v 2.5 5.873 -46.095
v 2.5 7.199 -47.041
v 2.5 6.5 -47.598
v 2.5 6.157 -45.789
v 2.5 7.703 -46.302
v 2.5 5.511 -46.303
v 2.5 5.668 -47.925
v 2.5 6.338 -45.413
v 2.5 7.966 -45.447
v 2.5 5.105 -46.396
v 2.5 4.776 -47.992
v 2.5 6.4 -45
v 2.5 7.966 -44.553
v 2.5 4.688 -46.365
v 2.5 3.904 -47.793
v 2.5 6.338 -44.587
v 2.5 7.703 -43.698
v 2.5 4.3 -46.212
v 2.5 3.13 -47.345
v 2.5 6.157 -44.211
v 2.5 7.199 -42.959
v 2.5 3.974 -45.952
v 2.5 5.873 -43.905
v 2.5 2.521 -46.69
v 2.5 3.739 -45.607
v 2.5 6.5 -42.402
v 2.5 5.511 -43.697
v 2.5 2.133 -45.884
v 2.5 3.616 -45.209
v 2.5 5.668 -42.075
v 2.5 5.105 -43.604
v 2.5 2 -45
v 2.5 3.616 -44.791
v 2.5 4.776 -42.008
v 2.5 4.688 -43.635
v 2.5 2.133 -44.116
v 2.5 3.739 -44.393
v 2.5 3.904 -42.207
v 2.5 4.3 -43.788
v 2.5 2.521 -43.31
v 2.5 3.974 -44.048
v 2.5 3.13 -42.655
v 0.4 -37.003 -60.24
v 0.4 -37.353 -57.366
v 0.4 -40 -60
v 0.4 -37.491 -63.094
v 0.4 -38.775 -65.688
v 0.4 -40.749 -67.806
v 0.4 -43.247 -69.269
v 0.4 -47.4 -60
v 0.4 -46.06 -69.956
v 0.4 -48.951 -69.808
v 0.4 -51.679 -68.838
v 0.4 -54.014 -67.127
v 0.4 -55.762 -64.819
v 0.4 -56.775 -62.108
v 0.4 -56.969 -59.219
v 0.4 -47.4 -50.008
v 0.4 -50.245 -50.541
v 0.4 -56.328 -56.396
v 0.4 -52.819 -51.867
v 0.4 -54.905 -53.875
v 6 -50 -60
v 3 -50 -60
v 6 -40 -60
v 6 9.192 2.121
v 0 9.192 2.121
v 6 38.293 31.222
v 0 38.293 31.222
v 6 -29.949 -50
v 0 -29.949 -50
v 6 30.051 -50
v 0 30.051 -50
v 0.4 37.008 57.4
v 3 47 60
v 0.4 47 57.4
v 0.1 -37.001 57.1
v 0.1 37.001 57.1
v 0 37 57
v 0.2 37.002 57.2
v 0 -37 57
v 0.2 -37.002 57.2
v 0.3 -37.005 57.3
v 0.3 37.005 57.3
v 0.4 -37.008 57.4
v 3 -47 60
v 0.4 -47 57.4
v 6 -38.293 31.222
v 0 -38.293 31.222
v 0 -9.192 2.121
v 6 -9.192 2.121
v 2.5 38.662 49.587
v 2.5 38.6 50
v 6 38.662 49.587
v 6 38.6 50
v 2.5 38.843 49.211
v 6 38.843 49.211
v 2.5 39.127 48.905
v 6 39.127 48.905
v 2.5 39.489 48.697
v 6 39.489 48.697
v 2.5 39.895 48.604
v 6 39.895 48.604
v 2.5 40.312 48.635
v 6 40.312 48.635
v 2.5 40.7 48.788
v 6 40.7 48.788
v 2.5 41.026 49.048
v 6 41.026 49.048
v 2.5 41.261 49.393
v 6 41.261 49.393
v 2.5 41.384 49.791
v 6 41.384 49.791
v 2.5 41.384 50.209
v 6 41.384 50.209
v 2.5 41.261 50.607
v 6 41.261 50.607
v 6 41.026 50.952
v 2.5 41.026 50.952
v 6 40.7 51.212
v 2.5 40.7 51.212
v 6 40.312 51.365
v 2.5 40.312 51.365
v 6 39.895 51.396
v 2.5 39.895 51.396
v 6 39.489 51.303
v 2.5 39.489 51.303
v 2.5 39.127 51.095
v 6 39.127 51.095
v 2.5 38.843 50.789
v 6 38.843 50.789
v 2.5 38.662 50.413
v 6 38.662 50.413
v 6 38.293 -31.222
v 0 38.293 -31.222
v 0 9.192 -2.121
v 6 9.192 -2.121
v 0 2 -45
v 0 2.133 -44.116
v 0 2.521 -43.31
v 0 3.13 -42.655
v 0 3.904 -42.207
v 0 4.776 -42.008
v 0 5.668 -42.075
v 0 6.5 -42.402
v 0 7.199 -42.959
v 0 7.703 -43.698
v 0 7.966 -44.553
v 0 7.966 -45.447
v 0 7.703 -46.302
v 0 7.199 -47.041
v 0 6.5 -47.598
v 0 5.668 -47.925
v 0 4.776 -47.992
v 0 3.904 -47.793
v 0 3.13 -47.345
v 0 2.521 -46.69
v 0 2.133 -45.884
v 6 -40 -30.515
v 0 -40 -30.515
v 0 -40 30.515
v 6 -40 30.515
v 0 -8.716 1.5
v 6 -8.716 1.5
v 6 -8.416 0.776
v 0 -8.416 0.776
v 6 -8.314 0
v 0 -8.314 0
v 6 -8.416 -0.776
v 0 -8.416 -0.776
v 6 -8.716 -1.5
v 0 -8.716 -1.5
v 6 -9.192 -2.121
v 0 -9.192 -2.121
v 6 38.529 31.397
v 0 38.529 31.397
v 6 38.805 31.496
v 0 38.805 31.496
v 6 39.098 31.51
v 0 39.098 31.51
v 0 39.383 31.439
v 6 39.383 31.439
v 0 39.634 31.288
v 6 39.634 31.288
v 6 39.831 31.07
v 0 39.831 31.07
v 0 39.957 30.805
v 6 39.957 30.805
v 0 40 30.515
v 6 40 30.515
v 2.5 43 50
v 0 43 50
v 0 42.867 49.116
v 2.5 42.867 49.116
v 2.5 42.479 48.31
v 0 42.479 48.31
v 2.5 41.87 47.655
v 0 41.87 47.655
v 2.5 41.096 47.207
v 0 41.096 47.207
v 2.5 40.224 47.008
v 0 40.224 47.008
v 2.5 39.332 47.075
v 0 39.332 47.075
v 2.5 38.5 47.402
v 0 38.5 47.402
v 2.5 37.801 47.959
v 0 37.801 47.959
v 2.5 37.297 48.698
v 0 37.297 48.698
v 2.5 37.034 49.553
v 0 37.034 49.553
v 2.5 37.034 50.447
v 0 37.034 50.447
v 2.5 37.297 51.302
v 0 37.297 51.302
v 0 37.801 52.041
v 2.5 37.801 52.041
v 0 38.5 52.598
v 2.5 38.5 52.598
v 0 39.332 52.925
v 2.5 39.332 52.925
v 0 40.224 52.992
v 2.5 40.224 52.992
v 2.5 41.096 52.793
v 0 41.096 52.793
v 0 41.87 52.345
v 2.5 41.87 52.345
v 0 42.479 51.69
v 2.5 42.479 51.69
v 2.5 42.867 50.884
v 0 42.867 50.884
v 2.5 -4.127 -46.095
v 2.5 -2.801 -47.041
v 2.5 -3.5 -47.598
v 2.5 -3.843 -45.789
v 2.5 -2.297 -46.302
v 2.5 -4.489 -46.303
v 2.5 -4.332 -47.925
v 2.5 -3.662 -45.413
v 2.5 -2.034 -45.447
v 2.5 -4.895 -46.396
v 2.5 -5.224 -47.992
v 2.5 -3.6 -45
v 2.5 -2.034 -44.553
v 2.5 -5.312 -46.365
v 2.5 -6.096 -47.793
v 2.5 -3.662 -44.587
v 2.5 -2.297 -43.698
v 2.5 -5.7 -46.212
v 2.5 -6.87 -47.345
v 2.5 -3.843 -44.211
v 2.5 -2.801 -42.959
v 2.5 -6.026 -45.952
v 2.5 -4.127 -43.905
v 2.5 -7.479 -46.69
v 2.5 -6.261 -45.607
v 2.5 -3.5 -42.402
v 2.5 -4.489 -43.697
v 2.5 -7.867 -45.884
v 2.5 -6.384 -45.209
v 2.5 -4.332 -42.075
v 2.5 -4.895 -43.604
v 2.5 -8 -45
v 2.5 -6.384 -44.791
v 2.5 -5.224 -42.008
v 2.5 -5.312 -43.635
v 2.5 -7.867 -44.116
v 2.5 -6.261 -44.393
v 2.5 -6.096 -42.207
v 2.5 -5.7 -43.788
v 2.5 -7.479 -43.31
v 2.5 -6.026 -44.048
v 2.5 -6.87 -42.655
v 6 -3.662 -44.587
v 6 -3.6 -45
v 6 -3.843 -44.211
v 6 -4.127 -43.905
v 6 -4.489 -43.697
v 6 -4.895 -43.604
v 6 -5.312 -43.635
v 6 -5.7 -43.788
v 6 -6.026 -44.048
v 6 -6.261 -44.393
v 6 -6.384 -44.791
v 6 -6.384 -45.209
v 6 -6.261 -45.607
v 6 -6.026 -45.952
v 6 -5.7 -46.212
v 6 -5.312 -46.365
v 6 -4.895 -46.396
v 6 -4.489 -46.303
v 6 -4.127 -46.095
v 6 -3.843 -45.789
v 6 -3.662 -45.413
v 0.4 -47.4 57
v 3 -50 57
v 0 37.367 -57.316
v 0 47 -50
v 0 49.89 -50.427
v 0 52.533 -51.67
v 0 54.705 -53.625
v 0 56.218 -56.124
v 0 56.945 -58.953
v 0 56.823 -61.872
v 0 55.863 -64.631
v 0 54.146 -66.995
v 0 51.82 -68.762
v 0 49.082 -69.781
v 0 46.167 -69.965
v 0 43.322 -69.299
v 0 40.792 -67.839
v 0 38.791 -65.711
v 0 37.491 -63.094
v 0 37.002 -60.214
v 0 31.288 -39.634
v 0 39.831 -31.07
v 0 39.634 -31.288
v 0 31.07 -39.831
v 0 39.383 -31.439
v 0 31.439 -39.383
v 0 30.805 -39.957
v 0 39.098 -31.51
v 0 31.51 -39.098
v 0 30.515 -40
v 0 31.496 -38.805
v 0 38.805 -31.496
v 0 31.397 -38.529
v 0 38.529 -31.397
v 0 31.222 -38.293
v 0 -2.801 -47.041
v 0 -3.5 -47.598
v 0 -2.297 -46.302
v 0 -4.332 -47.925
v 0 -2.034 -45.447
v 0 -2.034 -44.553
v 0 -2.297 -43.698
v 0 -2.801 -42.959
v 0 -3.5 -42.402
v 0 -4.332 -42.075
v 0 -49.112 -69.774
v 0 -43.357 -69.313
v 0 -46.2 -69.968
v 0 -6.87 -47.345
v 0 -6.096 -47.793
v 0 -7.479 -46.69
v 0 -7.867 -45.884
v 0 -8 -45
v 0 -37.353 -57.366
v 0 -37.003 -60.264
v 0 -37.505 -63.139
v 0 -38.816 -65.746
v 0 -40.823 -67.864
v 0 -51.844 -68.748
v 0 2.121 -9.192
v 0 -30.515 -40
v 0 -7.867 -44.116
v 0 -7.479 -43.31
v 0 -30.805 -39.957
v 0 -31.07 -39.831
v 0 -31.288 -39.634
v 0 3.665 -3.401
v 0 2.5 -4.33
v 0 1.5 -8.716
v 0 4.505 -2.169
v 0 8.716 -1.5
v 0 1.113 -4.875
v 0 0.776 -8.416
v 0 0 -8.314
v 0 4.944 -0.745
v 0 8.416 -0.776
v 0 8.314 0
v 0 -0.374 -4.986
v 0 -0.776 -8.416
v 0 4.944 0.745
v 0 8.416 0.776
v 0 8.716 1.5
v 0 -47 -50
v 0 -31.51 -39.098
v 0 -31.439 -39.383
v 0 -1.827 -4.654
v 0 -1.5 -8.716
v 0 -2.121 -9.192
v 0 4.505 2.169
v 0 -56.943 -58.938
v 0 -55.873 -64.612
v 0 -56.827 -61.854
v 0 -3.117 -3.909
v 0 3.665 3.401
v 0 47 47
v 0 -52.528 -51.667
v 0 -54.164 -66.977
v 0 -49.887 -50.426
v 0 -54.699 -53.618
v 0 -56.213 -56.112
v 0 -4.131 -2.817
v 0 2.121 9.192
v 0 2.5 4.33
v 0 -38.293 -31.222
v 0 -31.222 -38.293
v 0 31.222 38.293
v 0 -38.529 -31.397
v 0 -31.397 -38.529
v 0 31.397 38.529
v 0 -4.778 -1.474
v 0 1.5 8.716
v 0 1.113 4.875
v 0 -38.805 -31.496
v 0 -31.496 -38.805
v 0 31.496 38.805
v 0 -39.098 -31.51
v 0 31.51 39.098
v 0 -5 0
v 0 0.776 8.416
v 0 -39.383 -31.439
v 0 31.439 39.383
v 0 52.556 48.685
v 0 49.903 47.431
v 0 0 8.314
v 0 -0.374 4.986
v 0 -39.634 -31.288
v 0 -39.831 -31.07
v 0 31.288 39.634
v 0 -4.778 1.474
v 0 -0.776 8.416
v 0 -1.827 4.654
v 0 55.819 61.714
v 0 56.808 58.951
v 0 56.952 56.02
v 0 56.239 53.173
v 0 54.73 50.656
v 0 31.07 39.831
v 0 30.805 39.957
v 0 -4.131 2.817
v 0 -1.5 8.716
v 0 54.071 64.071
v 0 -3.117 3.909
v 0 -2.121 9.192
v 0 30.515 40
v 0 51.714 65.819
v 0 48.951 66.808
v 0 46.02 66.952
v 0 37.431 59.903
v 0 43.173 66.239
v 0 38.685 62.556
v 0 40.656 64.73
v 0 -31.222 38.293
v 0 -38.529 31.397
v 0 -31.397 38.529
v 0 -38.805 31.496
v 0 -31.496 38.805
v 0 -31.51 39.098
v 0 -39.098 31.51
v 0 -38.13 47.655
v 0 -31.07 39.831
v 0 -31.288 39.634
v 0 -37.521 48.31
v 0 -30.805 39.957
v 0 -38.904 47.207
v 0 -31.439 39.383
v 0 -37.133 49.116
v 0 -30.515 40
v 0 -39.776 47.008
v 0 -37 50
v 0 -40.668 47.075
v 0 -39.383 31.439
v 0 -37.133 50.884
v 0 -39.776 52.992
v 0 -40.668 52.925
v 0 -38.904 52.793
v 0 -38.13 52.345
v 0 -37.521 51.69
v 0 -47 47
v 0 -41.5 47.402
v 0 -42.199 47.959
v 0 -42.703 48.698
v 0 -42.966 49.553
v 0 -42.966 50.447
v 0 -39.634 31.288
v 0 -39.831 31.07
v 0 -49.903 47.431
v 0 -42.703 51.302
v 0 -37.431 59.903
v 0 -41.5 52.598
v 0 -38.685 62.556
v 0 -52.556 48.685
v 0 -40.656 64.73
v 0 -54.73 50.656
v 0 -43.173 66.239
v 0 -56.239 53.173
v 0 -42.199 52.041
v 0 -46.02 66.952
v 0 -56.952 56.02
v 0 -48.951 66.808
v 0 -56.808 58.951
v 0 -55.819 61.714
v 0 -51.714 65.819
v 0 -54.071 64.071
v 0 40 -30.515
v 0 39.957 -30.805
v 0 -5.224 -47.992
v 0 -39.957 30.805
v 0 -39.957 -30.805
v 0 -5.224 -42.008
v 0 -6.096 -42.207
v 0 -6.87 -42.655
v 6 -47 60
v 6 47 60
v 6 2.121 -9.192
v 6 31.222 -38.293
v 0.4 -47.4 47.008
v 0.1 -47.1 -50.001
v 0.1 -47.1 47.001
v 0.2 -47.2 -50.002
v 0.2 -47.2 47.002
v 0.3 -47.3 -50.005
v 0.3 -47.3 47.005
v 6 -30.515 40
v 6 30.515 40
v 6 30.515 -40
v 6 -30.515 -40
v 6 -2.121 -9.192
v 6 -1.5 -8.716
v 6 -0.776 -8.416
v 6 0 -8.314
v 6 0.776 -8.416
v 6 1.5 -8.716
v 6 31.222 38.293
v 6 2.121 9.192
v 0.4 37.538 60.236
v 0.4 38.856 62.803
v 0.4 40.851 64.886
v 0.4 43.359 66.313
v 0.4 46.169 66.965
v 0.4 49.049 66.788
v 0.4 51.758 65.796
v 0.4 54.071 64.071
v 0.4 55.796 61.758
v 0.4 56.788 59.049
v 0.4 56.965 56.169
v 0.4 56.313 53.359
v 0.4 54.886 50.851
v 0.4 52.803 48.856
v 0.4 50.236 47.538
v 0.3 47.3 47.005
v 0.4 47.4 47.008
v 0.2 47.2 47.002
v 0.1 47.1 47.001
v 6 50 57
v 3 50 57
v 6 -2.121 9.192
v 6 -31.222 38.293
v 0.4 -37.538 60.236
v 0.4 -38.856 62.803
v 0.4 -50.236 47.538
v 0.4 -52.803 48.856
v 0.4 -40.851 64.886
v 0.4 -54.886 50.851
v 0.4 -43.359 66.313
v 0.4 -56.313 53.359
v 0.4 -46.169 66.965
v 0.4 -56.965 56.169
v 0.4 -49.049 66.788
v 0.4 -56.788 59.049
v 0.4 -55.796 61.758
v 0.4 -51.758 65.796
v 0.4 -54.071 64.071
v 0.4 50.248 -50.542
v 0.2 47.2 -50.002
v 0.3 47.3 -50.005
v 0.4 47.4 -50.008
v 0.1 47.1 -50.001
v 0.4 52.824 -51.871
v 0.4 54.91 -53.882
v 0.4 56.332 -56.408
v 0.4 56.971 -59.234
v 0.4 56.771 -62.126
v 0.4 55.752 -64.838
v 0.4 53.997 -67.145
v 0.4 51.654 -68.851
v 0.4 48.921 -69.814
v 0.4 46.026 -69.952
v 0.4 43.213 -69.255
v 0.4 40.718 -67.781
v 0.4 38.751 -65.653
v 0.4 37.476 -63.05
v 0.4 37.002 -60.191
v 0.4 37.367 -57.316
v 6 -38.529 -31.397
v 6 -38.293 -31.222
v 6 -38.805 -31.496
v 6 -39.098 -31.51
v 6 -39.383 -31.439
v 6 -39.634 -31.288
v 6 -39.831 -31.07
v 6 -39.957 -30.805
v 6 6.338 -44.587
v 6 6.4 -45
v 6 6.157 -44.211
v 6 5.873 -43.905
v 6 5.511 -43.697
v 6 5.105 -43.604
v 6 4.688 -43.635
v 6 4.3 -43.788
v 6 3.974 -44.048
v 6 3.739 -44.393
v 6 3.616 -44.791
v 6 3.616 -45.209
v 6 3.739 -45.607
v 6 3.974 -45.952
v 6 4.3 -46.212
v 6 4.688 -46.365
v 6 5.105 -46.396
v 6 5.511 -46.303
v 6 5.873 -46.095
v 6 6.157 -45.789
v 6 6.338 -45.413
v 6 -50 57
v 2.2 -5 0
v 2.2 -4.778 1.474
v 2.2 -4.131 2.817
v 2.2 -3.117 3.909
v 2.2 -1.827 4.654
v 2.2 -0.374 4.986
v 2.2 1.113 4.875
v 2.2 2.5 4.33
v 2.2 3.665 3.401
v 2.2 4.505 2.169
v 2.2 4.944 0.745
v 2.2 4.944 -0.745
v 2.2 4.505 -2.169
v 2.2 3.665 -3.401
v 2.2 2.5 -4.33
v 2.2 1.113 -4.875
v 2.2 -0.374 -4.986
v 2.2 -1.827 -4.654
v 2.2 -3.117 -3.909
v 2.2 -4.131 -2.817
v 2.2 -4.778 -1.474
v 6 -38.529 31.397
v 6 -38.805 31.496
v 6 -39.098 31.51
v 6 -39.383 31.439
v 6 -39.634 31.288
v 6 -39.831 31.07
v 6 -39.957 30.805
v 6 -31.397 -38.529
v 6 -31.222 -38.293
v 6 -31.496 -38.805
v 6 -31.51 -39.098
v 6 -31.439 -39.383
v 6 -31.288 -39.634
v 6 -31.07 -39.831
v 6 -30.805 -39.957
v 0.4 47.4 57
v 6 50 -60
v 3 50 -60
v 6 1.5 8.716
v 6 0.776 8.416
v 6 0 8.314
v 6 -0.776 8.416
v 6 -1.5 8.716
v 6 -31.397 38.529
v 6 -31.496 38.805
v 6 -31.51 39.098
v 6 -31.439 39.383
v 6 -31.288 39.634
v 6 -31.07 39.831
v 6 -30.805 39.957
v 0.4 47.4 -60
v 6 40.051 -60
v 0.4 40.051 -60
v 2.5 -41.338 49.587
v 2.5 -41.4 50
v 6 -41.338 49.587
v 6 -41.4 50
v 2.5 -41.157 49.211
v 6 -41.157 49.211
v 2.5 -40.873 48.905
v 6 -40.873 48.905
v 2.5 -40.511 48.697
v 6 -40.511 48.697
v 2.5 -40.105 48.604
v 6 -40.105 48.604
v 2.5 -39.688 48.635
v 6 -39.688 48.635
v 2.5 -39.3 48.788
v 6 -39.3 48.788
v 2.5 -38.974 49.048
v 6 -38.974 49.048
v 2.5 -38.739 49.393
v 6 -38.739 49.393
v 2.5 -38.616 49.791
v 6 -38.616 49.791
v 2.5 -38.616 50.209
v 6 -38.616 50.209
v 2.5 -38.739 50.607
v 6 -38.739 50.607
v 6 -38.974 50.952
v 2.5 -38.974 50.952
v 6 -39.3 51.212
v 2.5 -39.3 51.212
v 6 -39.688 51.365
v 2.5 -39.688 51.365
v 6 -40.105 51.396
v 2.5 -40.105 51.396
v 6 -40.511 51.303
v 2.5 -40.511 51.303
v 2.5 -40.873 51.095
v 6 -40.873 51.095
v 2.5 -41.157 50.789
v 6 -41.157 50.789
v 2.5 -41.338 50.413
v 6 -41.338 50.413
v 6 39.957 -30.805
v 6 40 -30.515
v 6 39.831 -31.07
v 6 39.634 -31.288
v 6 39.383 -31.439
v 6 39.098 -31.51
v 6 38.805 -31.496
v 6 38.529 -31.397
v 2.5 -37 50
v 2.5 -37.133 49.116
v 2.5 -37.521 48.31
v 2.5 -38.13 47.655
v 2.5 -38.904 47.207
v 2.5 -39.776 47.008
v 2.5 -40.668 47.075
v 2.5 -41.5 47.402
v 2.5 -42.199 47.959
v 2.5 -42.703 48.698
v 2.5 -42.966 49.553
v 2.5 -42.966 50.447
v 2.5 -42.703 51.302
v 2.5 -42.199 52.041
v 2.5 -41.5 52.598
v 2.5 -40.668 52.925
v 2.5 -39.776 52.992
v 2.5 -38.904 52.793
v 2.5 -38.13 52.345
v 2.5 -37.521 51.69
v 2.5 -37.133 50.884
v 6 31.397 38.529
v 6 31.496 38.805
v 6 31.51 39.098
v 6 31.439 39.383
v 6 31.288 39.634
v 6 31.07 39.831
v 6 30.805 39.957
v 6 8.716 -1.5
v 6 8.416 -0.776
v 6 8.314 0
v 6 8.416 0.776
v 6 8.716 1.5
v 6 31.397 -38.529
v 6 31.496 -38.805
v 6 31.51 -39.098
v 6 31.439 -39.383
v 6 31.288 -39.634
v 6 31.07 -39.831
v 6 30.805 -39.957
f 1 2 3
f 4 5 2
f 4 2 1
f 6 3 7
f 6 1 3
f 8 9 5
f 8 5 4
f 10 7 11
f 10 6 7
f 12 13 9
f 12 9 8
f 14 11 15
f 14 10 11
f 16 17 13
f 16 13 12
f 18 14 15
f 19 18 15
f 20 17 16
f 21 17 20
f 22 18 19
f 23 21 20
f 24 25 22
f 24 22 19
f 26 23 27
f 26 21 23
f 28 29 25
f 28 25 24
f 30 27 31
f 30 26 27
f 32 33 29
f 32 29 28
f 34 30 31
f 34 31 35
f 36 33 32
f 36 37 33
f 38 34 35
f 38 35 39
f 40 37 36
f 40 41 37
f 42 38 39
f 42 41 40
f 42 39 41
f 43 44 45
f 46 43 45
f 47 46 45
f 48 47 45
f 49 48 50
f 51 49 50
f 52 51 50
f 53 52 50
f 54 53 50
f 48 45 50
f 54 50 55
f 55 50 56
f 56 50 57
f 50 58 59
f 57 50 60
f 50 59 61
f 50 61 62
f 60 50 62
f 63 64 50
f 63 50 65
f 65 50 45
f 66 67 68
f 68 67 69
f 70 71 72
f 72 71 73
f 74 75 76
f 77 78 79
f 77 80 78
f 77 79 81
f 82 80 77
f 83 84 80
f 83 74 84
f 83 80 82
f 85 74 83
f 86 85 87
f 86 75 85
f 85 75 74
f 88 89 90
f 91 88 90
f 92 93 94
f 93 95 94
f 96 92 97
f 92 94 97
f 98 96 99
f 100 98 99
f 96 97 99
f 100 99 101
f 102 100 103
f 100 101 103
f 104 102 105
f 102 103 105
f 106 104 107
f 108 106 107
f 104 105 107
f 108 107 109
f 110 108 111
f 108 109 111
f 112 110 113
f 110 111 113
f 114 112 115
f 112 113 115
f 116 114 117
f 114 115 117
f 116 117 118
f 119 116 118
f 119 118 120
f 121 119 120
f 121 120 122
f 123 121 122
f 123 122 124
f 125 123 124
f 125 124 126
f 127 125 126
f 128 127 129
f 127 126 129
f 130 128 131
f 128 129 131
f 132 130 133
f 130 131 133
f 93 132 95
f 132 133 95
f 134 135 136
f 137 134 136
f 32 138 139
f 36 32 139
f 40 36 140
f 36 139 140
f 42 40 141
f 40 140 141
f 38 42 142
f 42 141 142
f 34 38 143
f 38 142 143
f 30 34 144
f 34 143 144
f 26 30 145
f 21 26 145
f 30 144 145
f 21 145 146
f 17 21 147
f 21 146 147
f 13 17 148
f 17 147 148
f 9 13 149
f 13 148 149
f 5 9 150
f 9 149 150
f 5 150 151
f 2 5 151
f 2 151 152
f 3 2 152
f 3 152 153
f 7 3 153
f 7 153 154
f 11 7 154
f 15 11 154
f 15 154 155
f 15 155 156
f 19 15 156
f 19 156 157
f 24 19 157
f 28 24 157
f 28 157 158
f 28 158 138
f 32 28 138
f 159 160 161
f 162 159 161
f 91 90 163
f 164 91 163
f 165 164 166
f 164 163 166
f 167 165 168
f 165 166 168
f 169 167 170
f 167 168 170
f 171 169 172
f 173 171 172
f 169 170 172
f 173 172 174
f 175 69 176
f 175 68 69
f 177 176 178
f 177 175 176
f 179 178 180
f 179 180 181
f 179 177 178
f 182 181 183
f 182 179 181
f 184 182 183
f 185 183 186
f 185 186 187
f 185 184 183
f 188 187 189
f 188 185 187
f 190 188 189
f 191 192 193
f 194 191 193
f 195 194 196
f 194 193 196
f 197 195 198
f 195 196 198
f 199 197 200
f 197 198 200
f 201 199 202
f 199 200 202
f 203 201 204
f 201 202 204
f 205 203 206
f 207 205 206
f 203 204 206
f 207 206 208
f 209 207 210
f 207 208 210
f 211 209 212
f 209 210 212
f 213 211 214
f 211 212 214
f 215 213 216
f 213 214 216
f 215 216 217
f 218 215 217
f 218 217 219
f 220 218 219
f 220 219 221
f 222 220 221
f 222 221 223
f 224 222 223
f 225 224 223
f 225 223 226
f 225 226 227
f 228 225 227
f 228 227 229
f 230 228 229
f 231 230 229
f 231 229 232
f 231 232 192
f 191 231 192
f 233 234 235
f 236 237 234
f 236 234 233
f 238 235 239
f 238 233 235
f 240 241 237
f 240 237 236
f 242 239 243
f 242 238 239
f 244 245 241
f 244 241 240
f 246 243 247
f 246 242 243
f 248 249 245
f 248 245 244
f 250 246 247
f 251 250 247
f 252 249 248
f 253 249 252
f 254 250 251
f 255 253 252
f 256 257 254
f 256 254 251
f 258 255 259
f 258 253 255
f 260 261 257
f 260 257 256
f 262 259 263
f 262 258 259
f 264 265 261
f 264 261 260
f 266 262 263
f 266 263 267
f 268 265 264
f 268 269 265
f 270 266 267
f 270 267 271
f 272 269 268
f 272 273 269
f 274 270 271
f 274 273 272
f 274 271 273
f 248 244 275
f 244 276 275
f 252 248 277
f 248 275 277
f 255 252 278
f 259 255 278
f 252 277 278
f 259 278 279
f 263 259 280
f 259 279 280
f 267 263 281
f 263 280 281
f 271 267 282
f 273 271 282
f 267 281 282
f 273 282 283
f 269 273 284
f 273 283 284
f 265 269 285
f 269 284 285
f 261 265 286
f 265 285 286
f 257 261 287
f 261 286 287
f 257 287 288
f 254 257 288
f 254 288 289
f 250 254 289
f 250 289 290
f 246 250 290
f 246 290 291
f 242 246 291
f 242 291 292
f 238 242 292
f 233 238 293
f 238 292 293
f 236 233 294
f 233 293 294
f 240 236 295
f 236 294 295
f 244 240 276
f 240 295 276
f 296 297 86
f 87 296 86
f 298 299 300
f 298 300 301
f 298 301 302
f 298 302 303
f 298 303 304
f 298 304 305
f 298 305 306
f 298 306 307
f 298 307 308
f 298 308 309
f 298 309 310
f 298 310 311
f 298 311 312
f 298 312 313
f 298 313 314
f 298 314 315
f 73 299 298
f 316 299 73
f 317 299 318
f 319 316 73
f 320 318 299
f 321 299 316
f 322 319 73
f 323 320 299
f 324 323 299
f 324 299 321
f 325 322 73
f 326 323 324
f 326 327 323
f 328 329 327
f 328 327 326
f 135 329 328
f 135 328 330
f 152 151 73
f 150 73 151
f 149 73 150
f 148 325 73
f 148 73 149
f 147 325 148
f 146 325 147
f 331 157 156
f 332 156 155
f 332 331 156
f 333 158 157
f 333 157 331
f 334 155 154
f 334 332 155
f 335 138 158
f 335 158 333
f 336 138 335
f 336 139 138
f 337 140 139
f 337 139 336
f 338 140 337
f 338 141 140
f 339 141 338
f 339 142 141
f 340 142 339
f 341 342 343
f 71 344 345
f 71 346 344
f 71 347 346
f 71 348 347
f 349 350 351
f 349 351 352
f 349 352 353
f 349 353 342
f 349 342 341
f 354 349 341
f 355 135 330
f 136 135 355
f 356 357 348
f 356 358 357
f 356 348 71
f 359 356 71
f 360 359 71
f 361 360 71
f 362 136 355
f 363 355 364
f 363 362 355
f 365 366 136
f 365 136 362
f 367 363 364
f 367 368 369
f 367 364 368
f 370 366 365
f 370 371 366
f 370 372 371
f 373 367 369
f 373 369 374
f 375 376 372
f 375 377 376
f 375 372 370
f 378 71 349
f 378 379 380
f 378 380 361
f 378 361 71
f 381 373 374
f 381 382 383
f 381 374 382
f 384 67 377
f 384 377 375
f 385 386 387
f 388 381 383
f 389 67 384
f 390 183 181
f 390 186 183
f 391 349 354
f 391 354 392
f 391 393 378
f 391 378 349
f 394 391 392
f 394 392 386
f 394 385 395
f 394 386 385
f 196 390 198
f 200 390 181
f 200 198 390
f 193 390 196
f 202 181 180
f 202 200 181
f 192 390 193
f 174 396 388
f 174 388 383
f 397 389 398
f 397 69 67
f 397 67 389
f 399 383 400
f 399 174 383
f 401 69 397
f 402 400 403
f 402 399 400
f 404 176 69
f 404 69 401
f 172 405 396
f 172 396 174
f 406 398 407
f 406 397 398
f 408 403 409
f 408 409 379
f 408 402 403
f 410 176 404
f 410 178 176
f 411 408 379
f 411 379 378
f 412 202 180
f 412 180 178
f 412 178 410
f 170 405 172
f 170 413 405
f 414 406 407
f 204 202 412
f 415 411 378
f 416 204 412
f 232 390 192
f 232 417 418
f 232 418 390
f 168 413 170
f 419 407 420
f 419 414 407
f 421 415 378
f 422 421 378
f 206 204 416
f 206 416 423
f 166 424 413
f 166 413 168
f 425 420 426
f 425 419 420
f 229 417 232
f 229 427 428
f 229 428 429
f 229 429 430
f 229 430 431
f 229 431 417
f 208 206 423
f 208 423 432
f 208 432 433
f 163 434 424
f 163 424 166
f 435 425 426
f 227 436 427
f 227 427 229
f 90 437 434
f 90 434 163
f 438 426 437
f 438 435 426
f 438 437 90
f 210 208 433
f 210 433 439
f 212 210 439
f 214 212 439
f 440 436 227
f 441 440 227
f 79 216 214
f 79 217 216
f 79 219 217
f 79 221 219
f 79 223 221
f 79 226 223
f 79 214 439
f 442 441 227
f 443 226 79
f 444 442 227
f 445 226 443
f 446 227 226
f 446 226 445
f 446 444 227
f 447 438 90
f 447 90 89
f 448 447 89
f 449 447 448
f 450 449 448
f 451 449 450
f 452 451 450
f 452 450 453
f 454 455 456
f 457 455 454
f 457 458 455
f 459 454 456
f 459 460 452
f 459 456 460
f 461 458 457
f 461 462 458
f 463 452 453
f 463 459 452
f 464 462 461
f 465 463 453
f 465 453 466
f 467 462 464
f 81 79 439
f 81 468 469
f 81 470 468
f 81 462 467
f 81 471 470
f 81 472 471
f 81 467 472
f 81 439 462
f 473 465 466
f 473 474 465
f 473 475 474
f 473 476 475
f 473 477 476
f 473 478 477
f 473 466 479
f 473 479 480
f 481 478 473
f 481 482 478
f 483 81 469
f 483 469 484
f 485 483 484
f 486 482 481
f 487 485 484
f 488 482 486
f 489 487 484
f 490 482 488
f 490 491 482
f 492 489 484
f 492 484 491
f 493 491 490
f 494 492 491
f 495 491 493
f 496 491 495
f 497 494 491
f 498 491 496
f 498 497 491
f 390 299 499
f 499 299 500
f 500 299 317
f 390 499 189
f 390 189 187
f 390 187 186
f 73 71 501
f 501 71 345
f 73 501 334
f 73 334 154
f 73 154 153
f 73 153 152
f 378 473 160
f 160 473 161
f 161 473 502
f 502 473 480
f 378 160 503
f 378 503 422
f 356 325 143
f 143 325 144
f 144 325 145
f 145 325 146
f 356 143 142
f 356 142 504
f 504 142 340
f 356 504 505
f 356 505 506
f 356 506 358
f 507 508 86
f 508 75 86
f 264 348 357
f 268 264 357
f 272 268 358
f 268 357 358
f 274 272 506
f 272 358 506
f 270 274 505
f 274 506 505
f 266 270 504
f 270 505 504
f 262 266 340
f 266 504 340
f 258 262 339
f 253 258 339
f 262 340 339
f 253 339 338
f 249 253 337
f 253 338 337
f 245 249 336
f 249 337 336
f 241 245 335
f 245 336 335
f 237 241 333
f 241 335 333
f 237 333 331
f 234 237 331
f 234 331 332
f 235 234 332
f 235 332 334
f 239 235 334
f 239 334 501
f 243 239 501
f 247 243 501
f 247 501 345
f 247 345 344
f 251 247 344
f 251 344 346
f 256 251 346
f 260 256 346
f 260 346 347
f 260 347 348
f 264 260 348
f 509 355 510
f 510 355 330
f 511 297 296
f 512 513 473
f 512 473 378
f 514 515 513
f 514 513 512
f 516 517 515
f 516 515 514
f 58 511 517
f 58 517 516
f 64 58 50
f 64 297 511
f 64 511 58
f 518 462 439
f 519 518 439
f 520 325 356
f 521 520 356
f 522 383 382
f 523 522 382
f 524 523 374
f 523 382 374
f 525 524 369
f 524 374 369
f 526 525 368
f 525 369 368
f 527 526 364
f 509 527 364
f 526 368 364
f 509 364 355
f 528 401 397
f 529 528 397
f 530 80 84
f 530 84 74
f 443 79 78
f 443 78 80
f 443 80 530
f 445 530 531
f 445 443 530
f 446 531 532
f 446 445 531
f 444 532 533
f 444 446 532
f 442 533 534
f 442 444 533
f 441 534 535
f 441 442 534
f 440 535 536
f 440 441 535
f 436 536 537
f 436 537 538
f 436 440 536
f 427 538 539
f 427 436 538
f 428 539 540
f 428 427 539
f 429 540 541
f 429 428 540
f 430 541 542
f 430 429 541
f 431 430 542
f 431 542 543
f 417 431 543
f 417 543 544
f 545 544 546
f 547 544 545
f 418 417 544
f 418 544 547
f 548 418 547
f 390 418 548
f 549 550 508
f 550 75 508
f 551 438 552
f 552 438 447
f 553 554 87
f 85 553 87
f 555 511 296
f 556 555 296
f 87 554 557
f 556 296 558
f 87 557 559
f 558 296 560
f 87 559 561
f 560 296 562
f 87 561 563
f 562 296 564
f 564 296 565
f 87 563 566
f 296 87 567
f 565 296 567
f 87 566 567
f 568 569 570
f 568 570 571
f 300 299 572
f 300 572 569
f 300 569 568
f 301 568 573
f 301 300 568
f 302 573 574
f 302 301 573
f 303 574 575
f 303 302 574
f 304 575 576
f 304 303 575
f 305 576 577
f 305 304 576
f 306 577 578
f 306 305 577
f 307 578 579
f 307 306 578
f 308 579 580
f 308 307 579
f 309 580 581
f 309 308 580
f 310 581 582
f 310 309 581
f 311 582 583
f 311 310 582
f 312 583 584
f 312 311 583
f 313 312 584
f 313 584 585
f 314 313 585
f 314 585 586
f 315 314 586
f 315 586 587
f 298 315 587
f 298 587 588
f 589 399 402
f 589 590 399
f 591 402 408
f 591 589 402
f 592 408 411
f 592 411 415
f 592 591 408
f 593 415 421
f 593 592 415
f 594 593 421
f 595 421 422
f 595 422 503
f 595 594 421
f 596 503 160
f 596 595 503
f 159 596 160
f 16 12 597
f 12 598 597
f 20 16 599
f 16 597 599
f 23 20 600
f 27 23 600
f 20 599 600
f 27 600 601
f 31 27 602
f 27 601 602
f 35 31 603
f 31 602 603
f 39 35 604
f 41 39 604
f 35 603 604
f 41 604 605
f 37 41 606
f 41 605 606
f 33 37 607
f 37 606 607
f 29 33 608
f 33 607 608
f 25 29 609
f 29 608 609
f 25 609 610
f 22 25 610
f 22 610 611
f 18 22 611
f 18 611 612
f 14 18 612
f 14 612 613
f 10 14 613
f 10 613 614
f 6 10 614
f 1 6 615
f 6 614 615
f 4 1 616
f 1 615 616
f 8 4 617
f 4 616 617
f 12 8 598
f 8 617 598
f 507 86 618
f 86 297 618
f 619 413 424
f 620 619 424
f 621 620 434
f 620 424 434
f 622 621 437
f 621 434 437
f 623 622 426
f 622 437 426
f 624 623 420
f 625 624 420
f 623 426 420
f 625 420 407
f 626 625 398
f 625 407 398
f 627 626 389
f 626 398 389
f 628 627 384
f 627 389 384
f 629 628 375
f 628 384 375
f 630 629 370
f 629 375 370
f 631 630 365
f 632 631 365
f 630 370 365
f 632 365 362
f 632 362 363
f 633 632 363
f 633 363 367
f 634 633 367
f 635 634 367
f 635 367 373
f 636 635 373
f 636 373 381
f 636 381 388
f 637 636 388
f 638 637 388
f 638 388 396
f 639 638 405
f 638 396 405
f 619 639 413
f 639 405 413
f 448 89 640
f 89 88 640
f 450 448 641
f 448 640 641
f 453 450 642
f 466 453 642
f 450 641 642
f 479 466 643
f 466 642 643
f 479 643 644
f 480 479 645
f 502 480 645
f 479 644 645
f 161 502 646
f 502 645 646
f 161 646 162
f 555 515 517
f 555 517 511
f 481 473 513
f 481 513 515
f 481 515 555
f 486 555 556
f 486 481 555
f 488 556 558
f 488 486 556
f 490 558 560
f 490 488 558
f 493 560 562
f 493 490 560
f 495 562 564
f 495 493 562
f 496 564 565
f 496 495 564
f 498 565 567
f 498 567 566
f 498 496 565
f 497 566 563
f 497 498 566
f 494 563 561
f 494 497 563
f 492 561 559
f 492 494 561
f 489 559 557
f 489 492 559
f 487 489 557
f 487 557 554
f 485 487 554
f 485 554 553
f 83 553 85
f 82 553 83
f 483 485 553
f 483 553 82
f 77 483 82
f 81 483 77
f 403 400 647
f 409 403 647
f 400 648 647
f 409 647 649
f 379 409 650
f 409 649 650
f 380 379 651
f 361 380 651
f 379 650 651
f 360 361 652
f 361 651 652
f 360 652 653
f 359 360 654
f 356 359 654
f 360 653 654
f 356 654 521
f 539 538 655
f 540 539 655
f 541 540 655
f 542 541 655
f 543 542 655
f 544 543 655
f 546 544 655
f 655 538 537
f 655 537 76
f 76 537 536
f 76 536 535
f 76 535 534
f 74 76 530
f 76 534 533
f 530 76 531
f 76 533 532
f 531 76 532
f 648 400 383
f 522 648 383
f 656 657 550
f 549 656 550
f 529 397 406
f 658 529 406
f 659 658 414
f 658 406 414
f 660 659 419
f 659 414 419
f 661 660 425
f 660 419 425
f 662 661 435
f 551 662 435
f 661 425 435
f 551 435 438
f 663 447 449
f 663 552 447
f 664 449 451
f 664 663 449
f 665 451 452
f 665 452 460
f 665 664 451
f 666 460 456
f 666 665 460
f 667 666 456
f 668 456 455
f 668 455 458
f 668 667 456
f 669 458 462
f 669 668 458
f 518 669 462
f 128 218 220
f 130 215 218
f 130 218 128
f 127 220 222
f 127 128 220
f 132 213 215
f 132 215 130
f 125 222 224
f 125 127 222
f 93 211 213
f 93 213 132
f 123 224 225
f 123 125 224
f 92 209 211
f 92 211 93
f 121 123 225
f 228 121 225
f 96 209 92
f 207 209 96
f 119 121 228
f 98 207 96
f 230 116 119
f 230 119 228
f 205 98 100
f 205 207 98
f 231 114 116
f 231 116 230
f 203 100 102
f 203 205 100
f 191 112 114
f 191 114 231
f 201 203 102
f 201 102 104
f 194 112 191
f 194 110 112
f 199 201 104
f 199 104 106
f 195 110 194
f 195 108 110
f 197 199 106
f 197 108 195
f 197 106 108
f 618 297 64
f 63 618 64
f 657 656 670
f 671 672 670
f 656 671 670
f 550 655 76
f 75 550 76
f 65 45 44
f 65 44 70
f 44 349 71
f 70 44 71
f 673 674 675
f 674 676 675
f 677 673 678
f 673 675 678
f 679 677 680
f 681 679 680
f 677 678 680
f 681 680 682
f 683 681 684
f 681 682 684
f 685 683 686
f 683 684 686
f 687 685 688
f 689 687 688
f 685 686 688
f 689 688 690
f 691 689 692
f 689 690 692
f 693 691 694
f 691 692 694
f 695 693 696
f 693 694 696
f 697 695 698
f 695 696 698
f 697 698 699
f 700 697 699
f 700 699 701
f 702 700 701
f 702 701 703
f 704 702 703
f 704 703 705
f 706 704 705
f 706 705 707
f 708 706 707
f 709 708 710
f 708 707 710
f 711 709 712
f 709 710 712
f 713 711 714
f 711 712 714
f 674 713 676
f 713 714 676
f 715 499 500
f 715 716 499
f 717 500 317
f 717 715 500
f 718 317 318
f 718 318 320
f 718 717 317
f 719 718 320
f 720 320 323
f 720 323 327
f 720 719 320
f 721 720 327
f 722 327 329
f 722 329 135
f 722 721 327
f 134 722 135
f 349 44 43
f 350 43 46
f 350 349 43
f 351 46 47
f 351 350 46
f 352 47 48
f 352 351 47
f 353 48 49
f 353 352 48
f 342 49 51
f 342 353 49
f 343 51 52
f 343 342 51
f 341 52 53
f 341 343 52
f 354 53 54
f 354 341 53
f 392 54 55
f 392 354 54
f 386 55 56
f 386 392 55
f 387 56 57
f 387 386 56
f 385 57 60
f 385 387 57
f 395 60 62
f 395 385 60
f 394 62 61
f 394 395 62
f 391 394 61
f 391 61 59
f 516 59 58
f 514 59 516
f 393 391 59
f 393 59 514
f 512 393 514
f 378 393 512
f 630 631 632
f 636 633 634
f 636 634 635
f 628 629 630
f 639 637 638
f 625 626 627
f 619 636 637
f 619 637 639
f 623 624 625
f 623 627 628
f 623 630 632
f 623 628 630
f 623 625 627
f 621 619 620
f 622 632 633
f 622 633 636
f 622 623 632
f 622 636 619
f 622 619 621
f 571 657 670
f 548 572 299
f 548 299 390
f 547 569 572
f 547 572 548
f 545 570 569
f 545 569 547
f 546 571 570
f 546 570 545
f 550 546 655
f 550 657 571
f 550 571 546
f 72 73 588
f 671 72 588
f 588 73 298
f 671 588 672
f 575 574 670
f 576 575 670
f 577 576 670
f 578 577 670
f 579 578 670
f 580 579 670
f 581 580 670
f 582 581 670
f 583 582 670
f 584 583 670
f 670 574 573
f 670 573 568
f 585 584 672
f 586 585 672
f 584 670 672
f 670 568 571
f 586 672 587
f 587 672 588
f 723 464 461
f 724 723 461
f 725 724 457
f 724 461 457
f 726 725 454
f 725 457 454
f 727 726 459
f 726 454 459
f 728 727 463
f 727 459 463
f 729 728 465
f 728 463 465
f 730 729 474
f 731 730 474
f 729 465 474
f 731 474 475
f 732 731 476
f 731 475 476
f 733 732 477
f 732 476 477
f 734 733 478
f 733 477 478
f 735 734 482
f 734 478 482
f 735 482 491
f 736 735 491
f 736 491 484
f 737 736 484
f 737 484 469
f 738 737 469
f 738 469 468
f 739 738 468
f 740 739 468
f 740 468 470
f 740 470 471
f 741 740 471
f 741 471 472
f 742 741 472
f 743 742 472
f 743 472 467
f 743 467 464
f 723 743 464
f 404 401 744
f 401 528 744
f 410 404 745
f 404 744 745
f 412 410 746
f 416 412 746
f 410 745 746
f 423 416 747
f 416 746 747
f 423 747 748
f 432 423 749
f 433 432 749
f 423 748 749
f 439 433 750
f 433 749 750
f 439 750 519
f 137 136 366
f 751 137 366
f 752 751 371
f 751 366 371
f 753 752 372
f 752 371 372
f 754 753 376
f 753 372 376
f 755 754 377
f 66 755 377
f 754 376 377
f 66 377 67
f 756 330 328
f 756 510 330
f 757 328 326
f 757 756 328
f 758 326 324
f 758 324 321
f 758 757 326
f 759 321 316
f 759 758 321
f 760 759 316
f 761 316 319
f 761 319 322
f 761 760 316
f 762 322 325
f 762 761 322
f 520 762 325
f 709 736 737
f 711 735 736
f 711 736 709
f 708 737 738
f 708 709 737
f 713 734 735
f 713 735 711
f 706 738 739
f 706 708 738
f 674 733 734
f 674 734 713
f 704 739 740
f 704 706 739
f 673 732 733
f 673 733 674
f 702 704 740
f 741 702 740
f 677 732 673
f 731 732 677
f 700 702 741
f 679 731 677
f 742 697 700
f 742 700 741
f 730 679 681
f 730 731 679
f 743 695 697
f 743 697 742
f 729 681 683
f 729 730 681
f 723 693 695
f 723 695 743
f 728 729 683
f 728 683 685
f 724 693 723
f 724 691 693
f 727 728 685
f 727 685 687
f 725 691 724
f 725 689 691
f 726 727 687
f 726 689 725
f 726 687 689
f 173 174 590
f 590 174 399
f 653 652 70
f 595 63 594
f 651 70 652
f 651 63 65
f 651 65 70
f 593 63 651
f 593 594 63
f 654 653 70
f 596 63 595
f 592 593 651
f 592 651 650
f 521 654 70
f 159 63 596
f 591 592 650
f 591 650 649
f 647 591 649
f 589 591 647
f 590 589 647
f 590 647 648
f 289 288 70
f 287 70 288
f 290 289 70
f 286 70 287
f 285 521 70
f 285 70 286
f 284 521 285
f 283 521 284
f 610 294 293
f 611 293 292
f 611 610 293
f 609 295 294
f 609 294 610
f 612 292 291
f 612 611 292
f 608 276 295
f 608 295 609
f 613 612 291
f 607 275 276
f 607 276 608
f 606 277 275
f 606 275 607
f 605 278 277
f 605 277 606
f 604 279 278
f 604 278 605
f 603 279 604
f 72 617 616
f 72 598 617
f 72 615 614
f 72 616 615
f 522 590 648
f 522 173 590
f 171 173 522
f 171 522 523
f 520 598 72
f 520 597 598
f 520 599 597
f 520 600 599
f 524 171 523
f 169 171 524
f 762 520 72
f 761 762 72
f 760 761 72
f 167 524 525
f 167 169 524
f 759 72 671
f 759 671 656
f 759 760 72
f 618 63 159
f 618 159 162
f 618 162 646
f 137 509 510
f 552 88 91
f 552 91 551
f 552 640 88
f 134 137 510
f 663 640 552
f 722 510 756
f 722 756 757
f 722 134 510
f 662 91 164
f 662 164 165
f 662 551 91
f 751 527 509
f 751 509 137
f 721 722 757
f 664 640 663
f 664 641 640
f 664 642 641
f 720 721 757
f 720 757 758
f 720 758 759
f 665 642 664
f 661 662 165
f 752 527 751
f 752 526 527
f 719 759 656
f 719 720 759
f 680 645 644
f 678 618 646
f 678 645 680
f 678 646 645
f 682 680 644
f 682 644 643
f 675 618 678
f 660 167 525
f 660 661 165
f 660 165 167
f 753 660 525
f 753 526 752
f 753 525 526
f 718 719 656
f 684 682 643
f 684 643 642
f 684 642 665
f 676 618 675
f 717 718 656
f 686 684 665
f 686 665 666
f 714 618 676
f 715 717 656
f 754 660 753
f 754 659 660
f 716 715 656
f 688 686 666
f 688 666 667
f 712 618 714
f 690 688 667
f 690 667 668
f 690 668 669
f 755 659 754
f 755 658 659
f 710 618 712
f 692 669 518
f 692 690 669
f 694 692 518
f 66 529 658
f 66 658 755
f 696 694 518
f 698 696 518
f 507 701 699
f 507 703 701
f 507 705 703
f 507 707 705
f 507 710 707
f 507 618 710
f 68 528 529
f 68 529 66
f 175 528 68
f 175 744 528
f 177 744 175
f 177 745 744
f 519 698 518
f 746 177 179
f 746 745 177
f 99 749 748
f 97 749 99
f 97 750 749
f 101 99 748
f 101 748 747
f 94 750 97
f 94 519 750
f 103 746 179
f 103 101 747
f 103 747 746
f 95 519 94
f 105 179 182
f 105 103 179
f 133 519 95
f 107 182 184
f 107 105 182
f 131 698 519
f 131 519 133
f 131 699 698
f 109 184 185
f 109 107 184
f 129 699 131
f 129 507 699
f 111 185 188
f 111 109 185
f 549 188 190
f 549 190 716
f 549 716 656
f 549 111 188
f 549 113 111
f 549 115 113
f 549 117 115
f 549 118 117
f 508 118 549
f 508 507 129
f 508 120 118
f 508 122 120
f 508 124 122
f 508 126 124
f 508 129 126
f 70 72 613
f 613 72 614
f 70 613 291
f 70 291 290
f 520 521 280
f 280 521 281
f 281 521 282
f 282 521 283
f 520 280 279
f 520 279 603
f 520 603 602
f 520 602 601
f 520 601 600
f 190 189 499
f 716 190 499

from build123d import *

# Parameters (mm, degrees)
F1_DEPTH       = 6
F2_R           = 1
F3_D           = 2.8
F3_CBORE_D     = 6
F3_CBORE_DEPTH = 2.5
F4_R           = 5
F5_DEPTH       = 2.2
F7_D           = 2.8
F7_CBORE_D     = 6
F7_CBORE_DEPTH = 2.5
F8_SIZE        = 3
F10_DEPTH      = 0.4


with BuildPart() as f1:
    # F0 (on Right) → F1 (new body)
    with BuildSketch(Plane.YZ):
        Polygon((40.0512183458, -60), (50, -60), (50, 60), (-50, 60), (-50, -60), (-40, -60), (-29.9487816542, -50), (30.0512183458, -50), align=None)
        with BuildLine():
            Line((2.1213203436, -9.1923881554), (32.9289321881, -40))
            Line((32.9289321881, -40), (-32.9289321881, -40))
            Line((-32.9289321881, -40), (-2.1213203436, -9.1923881554))
            ThreePointArc((-2.1213203436, -9.1923881554), (0, -8.313708499), (2.1213203436, -9.1923881554))
        make_face(mode=Mode.SUBTRACT)
        with BuildLine():
            Line((-9.1923881554, -2.1213203436), (-40, -32.9289321881))
            Line((-40, -32.9289321881), (-40, 32.9289321881))
            Line((-40, 32.9289321881), (-9.1923881554, 2.1213203436))
            ThreePointArc((-9.1923881554, 2.1213203436), (-8.313708499, 0), (-9.1923881554, -2.1213203436))
        make_face(mode=Mode.SUBTRACT)
        with BuildLine():
            Line((40, 32.9289321881), (40, -32.9289321881))
            Line((40, -32.9289321881), (9.1923881554, -2.1213203436))
            ThreePointArc((9.1923881554, -2.1213203436), (8.313708499, 0), (9.1923881554, 2.1213203436))
            Line((9.1923881554, 2.1213203436), (40, 32.9289321881))
        make_face(mode=Mode.SUBTRACT)
        with BuildLine():
            Line((-32.9289321881, 40), (32.9289321881, 40))
            Line((32.9289321881, 40), (2.1213203436, 9.1923881554))
            ThreePointArc((2.1213203436, 9.1923881554), (0, 8.313708499), (-2.1213203436, 9.1923881554))
            Line((-2.1213203436, 9.1923881554), (-32.9289321881, 40))
        make_face(mode=Mode.SUBTRACT)
    extrude(amount=F1_DEPTH)

    # F2
    f2_edges = [f1.edges().sort_by_distance(p)[0] for p in [
        (3, -32.928932, 40),
        (3, 32.928932, 40),
        (3, -40, 32.928932),
        (3, -40, -32.928932),
        (3, -32.928932, -40),
        (3, 40, 32.928932),
        (3, 40, -32.928932),
        (3, 32.928932, -40),
    ]]
    fillet(f2_edges, radius=F2_R)

    # F3 (through all)
    with Locations(Plane(origin=(0, 0, 0), x_dir=(0, 1, 0), z_dir=(-1, 0, 0))):
        with Locations((-40, -50), (40, -50)):
            CounterBoreHole(F3_D / 2, F3_CBORE_D / 2, F3_CBORE_DEPTH)

    # F4 (on face) → F5 (cut)
    with BuildSketch(Plane(origin=(0, 0, 0), x_dir=(0, -1, 0), z_dir=(-1, 0, 0))):
        Circle(F4_R)
    extrude(amount=-F5_DEPTH, mode=Mode.SUBTRACT)

    # F7 (through all)
    with Locations(Plane(origin=(0, 0, 0), x_dir=(0, -1, 0), z_dir=(-1, 0, 0))):
        with Locations((-5, -45), (5, -45)):
            CounterBoreHole(F7_D / 2, F7_CBORE_D / 2, F7_CBORE_DEPTH)

    # F8
    f8_edges = [f1.edges().sort_by_distance(p)[0] for p in [
        (3, -50, 60),
        (3, 50, 60),
        (0, -50, 0),
        (0, 50, 0),
        (0, 0, 60),
    ]]
    chamfer(f8_edges, length=F8_SIZE)

    # F9 (on face) → F10 (join)
    with BuildSketch(Plane(origin=(0, 0, 0), x_dir=(0, -1, 0), z_dir=(-1, 0, 0))):
        with BuildLine():
            Line((-47, 57), (-37, 57))
            ThreePointArc((-37, 57), (-54.0710678119, 64.0710678119), (-47, 47))
            Line((-47, 47), (-47, 57))
        make_face()
        with BuildLine():
            ThreePointArc((47, 47), (54.0710678119, 64.0710678119), (37, 57))
            Line((37, 57), (47, 57))
            Line((47, 57), (47, 47))
        make_face()
        with BuildLine():
            Line((-47, -60), (-47, -50))
            ThreePointArc((-47, -50), (-53.0480452096, -67.9637396456), (-37.3669885172, -57.3157701715))
            Line((-37.3669885172, -57.3157701715), (-40.0512183458, -60))
            Line((-40.0512183458, -60), (-47, -60))
        make_face()
        with BuildLine():
            ThreePointArc((37.3529996858, -57.3664880981), (53.0689735945, -67.9478021811), (47, -50))
            Line((47, -50), (47, -60))
            Line((47, -60), (40, -60))
            Line((40, -60), (37.3529996858, -57.3664880981))
        make_face()
    extrude(amount=-F10_DEPTH)


solid = f1.part
